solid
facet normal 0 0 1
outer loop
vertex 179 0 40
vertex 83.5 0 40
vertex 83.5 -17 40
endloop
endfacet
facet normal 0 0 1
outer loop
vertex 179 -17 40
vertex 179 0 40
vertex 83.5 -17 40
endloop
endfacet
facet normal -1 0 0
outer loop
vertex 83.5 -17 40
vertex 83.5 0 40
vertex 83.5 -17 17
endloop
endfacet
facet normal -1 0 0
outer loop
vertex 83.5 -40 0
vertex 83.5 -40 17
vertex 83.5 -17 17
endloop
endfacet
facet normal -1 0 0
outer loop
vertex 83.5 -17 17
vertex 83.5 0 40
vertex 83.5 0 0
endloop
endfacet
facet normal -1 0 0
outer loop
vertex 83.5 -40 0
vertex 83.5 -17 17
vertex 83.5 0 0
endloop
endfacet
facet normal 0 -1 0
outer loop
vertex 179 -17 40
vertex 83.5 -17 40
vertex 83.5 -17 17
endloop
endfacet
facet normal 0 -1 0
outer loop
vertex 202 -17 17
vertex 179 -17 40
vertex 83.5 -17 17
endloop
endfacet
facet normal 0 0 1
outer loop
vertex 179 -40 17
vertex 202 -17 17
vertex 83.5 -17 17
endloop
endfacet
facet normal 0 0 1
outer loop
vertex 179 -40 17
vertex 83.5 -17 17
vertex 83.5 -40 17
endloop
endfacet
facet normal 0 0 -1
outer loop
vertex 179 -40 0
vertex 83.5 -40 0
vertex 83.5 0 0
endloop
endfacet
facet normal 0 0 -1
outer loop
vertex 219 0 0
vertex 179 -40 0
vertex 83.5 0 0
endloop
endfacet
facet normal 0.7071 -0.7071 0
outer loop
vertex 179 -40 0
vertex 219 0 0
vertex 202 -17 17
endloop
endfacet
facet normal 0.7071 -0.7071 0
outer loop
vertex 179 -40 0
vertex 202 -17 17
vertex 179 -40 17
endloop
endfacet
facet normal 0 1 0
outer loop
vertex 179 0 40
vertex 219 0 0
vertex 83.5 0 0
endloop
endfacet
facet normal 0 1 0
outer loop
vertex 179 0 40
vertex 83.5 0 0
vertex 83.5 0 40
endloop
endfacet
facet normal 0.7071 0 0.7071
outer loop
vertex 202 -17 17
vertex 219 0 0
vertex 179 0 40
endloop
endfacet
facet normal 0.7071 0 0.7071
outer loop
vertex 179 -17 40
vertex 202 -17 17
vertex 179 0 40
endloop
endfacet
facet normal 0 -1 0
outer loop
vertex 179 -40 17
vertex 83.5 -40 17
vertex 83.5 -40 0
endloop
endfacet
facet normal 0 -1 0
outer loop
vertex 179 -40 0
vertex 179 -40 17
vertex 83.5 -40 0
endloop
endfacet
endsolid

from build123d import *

# Parameters (mm, degrees)
BOSS_EXTRU_1_START      = 83.500046
BOSS_EXTRU_1_DEPTH      = 135.5
ENL_V_MAT_EXTRU_1_DEPTH = 41
ENL_V_MAT_EXTRU_2_DEPTH = 41


with BuildPart() as part:
    # Esquisse1 → Boss.-Extru.1 (new body)
    with BuildSketch(Plane(origin=(0, 0, 0), x_dir=(0, 0, -1), z_dir=(1, 0, 0)).offset(BOSS_EXTRU_1_START)):
        Polygon((0, 0), (-40, 0), (-40, -17), (-17, -17), (-17, -40), (0, -40), align=None)
    extrude(amount=BOSS_EXTRU_1_DEPTH)

    # Esquisse2 → Enlèv. mat.-Extru.1 (cut, through all)
    with BuildSketch(Plane(origin=(0, 0, 0), x_dir=(1, 0, 0), z_dir=(0, 1, 0))):
        Polygon((219.000046471, 0), (179.000046471, -40), (219.000046471, -40), align=None)
    extrude(amount=-ENL_V_MAT_EXTRU_1_DEPTH, mode=Mode.SUBTRACT)

    # Esquisse3 → Enlèv. mat.-Extru.2 (cut, through all)
    with BuildSketch(Plane(origin=(0, 0, 0), x_dir=(-1, 0, 0), z_dir=(0, 0, -1))):
        Polygon((-219.000046471, 0), (-179.000046471, -40), (-219.000046471, -40), align=None)
    extrude(amount=-ENL_V_MAT_EXTRU_2_DEPTH, mode=Mode.SUBTRACT)


solid = part.part
